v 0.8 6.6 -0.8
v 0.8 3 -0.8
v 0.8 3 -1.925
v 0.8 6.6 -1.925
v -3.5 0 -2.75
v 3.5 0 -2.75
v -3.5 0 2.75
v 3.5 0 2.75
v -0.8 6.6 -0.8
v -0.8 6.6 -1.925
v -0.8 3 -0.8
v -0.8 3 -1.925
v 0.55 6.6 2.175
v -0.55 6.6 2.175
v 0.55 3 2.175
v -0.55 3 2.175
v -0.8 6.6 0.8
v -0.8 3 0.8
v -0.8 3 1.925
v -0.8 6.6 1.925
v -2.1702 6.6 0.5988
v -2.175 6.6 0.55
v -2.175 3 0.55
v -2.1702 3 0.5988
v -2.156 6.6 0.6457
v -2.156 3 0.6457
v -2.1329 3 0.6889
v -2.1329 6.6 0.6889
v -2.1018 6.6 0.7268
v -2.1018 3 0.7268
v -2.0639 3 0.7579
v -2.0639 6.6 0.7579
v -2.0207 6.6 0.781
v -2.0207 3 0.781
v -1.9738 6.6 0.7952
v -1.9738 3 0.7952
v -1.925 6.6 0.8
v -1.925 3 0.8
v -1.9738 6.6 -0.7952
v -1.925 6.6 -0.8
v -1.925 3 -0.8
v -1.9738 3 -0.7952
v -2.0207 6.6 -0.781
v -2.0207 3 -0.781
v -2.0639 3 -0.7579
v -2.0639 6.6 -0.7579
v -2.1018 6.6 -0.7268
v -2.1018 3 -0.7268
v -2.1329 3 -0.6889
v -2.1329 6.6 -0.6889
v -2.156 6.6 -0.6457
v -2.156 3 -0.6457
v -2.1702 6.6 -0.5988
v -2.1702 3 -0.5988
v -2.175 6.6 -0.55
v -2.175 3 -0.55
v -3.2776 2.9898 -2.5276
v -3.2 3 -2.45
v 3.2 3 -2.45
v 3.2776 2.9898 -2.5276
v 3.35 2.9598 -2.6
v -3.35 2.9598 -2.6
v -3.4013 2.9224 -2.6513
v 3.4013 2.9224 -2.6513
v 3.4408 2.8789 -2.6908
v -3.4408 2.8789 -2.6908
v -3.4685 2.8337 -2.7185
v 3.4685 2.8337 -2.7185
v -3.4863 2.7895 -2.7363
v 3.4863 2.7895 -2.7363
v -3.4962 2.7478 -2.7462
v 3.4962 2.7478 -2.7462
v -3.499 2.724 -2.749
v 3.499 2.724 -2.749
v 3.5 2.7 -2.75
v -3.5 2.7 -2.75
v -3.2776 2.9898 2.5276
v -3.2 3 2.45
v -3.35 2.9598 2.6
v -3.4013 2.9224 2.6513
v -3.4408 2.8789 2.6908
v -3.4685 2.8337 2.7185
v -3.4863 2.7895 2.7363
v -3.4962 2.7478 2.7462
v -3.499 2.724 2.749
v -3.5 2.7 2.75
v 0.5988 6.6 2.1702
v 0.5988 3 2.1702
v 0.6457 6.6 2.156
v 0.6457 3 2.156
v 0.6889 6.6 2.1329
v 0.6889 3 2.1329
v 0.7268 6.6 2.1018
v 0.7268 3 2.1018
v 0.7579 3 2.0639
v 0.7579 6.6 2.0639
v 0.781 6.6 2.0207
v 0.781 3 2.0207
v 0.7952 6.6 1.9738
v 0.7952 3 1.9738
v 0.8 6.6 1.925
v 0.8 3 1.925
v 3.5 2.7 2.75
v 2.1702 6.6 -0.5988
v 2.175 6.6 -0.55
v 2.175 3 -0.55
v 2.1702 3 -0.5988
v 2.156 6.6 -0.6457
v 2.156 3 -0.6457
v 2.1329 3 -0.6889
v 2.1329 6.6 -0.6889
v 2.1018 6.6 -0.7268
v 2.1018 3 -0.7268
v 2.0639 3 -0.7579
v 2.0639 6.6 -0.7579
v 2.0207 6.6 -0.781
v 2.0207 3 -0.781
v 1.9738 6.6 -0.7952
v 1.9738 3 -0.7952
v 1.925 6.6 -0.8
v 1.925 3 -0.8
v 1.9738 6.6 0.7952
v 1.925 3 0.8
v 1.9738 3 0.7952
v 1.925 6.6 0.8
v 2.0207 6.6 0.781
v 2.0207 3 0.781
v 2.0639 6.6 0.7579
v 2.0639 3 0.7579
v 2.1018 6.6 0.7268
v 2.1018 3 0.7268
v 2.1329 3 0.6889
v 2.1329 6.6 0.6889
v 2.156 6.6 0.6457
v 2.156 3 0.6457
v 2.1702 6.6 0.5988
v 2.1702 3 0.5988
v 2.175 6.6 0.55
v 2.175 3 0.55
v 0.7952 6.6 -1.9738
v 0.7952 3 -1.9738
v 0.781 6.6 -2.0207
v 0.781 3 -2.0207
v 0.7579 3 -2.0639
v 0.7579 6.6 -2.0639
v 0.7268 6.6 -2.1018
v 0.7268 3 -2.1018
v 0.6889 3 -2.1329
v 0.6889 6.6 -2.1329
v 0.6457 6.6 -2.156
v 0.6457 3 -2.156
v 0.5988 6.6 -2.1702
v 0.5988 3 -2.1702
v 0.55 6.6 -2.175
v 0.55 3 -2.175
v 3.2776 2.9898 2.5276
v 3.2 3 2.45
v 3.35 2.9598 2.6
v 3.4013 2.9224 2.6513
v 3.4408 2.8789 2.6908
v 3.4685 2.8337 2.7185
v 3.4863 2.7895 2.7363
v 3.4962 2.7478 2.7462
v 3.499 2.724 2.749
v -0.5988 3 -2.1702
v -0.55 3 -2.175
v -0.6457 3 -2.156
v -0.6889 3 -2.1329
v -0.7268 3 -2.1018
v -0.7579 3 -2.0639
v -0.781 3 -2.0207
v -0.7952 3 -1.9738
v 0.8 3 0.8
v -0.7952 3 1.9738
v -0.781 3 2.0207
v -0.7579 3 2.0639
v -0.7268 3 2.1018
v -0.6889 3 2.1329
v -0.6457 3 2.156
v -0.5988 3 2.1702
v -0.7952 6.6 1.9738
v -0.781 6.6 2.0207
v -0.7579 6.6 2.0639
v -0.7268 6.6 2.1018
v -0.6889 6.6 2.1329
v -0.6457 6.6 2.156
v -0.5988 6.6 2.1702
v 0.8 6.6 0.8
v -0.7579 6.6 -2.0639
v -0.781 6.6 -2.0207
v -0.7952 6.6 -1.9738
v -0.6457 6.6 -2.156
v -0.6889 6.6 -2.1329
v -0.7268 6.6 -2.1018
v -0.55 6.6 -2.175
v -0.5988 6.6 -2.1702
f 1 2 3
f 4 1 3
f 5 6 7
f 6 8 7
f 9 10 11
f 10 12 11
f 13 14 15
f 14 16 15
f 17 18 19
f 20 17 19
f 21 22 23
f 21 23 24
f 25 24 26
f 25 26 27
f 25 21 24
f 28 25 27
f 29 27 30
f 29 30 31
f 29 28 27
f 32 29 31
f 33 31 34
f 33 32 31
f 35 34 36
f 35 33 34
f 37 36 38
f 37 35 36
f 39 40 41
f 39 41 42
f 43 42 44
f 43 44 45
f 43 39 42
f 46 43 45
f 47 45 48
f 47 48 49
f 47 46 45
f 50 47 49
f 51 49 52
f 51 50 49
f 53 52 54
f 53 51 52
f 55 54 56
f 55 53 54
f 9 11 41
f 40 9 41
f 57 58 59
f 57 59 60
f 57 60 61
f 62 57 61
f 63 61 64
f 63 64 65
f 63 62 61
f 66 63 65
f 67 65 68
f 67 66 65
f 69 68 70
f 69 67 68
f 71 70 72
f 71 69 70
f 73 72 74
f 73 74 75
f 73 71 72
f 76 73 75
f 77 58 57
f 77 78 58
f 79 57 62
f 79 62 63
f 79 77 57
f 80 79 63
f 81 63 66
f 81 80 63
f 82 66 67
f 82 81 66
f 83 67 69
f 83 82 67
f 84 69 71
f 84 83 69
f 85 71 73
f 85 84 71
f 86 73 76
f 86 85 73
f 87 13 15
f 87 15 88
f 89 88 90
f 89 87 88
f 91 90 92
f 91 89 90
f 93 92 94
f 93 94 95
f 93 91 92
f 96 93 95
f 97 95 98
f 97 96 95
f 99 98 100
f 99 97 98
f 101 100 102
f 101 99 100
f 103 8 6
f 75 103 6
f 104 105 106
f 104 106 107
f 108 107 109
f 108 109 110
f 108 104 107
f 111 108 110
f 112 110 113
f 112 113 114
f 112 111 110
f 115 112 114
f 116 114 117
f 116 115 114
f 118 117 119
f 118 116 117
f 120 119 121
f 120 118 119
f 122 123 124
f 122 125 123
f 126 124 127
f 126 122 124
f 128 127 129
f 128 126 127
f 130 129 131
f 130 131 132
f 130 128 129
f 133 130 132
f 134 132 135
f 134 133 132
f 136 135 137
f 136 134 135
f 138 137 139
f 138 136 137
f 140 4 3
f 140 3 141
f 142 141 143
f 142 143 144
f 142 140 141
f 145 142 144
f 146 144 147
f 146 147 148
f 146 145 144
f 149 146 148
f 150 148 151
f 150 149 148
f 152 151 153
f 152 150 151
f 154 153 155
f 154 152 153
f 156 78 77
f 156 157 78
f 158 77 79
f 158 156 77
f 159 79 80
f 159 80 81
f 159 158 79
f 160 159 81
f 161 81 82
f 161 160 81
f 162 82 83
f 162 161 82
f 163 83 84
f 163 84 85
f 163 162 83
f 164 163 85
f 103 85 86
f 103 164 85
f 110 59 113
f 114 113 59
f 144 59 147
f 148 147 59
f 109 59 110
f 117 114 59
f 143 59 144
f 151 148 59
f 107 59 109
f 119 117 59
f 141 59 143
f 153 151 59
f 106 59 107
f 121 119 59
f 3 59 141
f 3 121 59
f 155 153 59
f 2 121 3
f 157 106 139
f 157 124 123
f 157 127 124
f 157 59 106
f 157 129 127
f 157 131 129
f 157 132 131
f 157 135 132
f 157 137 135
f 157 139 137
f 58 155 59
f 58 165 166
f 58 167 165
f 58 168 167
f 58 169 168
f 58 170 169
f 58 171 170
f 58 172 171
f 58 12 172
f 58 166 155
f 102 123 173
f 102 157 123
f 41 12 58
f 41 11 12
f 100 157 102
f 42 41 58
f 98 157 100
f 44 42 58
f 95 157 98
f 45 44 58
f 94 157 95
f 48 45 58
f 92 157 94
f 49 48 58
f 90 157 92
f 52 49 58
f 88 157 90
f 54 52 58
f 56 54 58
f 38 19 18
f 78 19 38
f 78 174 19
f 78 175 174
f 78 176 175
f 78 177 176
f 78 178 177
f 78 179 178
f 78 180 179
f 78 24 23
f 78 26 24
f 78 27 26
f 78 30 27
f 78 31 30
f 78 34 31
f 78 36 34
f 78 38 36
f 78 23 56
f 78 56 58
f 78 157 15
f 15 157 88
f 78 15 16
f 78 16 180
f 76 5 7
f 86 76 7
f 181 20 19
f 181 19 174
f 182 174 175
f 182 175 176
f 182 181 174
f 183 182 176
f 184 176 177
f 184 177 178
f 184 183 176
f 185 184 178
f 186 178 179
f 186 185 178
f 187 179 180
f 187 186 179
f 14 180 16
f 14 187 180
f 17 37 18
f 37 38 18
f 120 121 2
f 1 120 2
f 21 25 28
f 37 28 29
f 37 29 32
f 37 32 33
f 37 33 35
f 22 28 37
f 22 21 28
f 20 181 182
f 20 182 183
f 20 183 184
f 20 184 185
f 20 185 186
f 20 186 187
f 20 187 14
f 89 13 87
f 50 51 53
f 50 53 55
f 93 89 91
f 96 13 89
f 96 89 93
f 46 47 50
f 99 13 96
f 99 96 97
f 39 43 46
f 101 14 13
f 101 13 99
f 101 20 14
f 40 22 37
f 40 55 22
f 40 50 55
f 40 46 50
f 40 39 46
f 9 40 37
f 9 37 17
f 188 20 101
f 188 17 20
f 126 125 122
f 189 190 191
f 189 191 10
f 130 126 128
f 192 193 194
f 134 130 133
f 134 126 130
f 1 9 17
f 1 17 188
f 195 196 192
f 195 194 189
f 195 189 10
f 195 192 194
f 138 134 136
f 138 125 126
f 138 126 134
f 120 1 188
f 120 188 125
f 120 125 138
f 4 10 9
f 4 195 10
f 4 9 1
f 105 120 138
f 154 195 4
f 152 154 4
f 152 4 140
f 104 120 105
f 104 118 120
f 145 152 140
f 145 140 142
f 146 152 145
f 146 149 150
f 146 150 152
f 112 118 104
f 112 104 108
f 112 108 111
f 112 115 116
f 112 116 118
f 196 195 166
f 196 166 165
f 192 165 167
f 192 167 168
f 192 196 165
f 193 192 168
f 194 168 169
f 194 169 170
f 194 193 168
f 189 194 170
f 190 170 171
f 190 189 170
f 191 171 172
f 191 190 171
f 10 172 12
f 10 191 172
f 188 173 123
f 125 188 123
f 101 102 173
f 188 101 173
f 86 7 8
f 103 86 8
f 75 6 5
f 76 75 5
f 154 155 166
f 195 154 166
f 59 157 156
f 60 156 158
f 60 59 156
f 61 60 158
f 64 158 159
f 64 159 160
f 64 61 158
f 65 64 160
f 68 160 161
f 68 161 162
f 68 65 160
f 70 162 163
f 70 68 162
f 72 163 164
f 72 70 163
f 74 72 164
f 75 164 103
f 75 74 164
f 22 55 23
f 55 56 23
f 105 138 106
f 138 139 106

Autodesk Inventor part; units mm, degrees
ref_plane "YZ Plane" through (0, 0, 0) normal (1, 0, 0) x (0, 1, 0)
ref_plane "XZ Plane" through (0, 0, 0) normal (0, 1, 0) x (-1, 0, 0)
ref_plane "XY Plane" through (0, 0, 0) normal (0, 0, 1) x (1, 0, 0)
sketch "Pole Base Profile" plane through (0, 0, 0) normal (0, 1, 0) x (-1, 0, 0)
  line L0 (3.5, 2.75) -> (-3.5, 2.75)
  line L1 (-3.5, 2.75) -> (-3.5, -2.75)
  line L2 (-3.5, -2.75) -> (3.5, -2.75)
  line L3 (3.5, -2.75) -> (3.5, 2.75)
  line L4 (3.5, 2.75) -> (-3.5, -2.75) construction
  line L5 (-3.5, 2.75) -> (3.5, -2.75) construction
  point P0 (0, 0)
  dimension "d0" = 7
  dimension "d1" = 5.5
extrude "Pole Base" add sketch "Pole Base Profile" along normal blind 3
sketch "Cross Base" plane through (0, 3, 0) normal (0, 1, 0) x (1, 0, 0)
  line L0 (-0.8, -2.175) -> (0.8, -2.175)
  line L1 (0.8, -2.175) -> (0.8, 2.175)
  line L2 (0.8, 2.175) -> (-0.8, 2.175)
  line L3 (-0.8, 2.175) -> (-0.8, -2.175)
  line L4 (-0.8, -2.175) -> (0.8, 2.175) construction
  line L5 (0.8, -2.175) -> (-0.8, 2.175) construction
  line L6 (-2.175, -0.8) -> (2.175, -0.8)
  line L7 (2.175, -0.8) -> (2.175, 0.8)
  line L8 (2.175, 0.8) -> (-2.175, 0.8)
  line L9 (-2.175, 0.8) -> (-2.175, -0.8)
  line L10 (-2.175, -0.8) -> (2.175, 0.8) construction
  line L11 (2.175, -0.8) -> (-2.175, 0.8) construction
  point P0 (0, 0)
  dimension "d12" = 1.6
  dimension "d13" = 4.35
  dimension "d14" = 4.35
  dimension "d15" = 1.6
extrude "Pole" add sketch "Cross Base" along normal blind 3.6
fillet "Pole Rounding" radius 0.25 8 edges at (2.175, 4.8, 0.8) (0.8, 4.8, 2.175) (-0.8, 4.8, 2.175) (-2.175, 4.8, 0.8) (-2.175, 4.8, -0.8) (-0.8, 4.8, -2.175) (0.8, 4.8, -2.175) (2.175, 4.8, -0.8)
fillet "Base Rounding" radius 0.3 4 edges at (-3.5, 3, 0) (0, 3, -2.75) (0, 3, 2.75) (3.5, 3, 0)
sketch "Top Center Point" plane through (0, 6.6, 0) normal (0, 1, 0) x (1, 0, 0)
  point P0 (0, 0)
equation "\"d0\" = s_polebl"
equation "\"d1\" = s_polebw"
equation "\"d12\" = k_cmxw"
equation "\"d13\" = k_cmxl"
equation "\"d14\" = d13"
equation "\"d15\" = d12"
equation "\"d8\" = s_poleh"
equation "\"k_width\" = 18.1"
equation "\"k_height\" = 18"
equation "\"k_taper1\" = 1.5"
equation "\"k_taper2\" = 0.5"
equation "\"k_radius\" = 6"
equation "\"k_wthick\" = 1.5"
equation "\"k_ribthick\" = 1.5"
equation "\"k_ribheight\" = 5"
equation "\"k_poleoff\" = 2.2625"
equation "\"k_poledia\" = 5.54"
equation "\"k_cmxw\" = 1.6"
equation "\"k_cmxl\" = 4.35"
equation "\"s_bwidth\" = 15.6"
equation "\"s_poleh\" = 3.6"
equation "\"s_polebw\" = 5.5"
equation "\"s_polebl\" = 7"
equation "\"b_rshift\" = 49.775"
equation "\"b_height\" = 77.4"
equation "\"b_tab\" = 27.15"
equation "\"b_lshift\" = 40.725"
equation "\"b_space\" = 117.65"
equation "\"b_caps\" = 31.675"
equation "\"b_pad\" = 1"
equation "\"b_width\" = 286.5"
equation "\"b_ctrl\" = 22.625"
equation "\"k_staper\" = 1"
equation "\"k_ltaper\" = 1.5"
equation "\"k_sradius\" = 4"
equation "\"k_lradius\" = 6"
equation "\"k_height_t\" = 16"
equation "\"k_height_low\" = 16"
equation "\"k_taper_wide\" = 1.5"
equation "\"k_taper_thin\" = 0.5"
properties part number "keyswitch-pole_cherrymx"
